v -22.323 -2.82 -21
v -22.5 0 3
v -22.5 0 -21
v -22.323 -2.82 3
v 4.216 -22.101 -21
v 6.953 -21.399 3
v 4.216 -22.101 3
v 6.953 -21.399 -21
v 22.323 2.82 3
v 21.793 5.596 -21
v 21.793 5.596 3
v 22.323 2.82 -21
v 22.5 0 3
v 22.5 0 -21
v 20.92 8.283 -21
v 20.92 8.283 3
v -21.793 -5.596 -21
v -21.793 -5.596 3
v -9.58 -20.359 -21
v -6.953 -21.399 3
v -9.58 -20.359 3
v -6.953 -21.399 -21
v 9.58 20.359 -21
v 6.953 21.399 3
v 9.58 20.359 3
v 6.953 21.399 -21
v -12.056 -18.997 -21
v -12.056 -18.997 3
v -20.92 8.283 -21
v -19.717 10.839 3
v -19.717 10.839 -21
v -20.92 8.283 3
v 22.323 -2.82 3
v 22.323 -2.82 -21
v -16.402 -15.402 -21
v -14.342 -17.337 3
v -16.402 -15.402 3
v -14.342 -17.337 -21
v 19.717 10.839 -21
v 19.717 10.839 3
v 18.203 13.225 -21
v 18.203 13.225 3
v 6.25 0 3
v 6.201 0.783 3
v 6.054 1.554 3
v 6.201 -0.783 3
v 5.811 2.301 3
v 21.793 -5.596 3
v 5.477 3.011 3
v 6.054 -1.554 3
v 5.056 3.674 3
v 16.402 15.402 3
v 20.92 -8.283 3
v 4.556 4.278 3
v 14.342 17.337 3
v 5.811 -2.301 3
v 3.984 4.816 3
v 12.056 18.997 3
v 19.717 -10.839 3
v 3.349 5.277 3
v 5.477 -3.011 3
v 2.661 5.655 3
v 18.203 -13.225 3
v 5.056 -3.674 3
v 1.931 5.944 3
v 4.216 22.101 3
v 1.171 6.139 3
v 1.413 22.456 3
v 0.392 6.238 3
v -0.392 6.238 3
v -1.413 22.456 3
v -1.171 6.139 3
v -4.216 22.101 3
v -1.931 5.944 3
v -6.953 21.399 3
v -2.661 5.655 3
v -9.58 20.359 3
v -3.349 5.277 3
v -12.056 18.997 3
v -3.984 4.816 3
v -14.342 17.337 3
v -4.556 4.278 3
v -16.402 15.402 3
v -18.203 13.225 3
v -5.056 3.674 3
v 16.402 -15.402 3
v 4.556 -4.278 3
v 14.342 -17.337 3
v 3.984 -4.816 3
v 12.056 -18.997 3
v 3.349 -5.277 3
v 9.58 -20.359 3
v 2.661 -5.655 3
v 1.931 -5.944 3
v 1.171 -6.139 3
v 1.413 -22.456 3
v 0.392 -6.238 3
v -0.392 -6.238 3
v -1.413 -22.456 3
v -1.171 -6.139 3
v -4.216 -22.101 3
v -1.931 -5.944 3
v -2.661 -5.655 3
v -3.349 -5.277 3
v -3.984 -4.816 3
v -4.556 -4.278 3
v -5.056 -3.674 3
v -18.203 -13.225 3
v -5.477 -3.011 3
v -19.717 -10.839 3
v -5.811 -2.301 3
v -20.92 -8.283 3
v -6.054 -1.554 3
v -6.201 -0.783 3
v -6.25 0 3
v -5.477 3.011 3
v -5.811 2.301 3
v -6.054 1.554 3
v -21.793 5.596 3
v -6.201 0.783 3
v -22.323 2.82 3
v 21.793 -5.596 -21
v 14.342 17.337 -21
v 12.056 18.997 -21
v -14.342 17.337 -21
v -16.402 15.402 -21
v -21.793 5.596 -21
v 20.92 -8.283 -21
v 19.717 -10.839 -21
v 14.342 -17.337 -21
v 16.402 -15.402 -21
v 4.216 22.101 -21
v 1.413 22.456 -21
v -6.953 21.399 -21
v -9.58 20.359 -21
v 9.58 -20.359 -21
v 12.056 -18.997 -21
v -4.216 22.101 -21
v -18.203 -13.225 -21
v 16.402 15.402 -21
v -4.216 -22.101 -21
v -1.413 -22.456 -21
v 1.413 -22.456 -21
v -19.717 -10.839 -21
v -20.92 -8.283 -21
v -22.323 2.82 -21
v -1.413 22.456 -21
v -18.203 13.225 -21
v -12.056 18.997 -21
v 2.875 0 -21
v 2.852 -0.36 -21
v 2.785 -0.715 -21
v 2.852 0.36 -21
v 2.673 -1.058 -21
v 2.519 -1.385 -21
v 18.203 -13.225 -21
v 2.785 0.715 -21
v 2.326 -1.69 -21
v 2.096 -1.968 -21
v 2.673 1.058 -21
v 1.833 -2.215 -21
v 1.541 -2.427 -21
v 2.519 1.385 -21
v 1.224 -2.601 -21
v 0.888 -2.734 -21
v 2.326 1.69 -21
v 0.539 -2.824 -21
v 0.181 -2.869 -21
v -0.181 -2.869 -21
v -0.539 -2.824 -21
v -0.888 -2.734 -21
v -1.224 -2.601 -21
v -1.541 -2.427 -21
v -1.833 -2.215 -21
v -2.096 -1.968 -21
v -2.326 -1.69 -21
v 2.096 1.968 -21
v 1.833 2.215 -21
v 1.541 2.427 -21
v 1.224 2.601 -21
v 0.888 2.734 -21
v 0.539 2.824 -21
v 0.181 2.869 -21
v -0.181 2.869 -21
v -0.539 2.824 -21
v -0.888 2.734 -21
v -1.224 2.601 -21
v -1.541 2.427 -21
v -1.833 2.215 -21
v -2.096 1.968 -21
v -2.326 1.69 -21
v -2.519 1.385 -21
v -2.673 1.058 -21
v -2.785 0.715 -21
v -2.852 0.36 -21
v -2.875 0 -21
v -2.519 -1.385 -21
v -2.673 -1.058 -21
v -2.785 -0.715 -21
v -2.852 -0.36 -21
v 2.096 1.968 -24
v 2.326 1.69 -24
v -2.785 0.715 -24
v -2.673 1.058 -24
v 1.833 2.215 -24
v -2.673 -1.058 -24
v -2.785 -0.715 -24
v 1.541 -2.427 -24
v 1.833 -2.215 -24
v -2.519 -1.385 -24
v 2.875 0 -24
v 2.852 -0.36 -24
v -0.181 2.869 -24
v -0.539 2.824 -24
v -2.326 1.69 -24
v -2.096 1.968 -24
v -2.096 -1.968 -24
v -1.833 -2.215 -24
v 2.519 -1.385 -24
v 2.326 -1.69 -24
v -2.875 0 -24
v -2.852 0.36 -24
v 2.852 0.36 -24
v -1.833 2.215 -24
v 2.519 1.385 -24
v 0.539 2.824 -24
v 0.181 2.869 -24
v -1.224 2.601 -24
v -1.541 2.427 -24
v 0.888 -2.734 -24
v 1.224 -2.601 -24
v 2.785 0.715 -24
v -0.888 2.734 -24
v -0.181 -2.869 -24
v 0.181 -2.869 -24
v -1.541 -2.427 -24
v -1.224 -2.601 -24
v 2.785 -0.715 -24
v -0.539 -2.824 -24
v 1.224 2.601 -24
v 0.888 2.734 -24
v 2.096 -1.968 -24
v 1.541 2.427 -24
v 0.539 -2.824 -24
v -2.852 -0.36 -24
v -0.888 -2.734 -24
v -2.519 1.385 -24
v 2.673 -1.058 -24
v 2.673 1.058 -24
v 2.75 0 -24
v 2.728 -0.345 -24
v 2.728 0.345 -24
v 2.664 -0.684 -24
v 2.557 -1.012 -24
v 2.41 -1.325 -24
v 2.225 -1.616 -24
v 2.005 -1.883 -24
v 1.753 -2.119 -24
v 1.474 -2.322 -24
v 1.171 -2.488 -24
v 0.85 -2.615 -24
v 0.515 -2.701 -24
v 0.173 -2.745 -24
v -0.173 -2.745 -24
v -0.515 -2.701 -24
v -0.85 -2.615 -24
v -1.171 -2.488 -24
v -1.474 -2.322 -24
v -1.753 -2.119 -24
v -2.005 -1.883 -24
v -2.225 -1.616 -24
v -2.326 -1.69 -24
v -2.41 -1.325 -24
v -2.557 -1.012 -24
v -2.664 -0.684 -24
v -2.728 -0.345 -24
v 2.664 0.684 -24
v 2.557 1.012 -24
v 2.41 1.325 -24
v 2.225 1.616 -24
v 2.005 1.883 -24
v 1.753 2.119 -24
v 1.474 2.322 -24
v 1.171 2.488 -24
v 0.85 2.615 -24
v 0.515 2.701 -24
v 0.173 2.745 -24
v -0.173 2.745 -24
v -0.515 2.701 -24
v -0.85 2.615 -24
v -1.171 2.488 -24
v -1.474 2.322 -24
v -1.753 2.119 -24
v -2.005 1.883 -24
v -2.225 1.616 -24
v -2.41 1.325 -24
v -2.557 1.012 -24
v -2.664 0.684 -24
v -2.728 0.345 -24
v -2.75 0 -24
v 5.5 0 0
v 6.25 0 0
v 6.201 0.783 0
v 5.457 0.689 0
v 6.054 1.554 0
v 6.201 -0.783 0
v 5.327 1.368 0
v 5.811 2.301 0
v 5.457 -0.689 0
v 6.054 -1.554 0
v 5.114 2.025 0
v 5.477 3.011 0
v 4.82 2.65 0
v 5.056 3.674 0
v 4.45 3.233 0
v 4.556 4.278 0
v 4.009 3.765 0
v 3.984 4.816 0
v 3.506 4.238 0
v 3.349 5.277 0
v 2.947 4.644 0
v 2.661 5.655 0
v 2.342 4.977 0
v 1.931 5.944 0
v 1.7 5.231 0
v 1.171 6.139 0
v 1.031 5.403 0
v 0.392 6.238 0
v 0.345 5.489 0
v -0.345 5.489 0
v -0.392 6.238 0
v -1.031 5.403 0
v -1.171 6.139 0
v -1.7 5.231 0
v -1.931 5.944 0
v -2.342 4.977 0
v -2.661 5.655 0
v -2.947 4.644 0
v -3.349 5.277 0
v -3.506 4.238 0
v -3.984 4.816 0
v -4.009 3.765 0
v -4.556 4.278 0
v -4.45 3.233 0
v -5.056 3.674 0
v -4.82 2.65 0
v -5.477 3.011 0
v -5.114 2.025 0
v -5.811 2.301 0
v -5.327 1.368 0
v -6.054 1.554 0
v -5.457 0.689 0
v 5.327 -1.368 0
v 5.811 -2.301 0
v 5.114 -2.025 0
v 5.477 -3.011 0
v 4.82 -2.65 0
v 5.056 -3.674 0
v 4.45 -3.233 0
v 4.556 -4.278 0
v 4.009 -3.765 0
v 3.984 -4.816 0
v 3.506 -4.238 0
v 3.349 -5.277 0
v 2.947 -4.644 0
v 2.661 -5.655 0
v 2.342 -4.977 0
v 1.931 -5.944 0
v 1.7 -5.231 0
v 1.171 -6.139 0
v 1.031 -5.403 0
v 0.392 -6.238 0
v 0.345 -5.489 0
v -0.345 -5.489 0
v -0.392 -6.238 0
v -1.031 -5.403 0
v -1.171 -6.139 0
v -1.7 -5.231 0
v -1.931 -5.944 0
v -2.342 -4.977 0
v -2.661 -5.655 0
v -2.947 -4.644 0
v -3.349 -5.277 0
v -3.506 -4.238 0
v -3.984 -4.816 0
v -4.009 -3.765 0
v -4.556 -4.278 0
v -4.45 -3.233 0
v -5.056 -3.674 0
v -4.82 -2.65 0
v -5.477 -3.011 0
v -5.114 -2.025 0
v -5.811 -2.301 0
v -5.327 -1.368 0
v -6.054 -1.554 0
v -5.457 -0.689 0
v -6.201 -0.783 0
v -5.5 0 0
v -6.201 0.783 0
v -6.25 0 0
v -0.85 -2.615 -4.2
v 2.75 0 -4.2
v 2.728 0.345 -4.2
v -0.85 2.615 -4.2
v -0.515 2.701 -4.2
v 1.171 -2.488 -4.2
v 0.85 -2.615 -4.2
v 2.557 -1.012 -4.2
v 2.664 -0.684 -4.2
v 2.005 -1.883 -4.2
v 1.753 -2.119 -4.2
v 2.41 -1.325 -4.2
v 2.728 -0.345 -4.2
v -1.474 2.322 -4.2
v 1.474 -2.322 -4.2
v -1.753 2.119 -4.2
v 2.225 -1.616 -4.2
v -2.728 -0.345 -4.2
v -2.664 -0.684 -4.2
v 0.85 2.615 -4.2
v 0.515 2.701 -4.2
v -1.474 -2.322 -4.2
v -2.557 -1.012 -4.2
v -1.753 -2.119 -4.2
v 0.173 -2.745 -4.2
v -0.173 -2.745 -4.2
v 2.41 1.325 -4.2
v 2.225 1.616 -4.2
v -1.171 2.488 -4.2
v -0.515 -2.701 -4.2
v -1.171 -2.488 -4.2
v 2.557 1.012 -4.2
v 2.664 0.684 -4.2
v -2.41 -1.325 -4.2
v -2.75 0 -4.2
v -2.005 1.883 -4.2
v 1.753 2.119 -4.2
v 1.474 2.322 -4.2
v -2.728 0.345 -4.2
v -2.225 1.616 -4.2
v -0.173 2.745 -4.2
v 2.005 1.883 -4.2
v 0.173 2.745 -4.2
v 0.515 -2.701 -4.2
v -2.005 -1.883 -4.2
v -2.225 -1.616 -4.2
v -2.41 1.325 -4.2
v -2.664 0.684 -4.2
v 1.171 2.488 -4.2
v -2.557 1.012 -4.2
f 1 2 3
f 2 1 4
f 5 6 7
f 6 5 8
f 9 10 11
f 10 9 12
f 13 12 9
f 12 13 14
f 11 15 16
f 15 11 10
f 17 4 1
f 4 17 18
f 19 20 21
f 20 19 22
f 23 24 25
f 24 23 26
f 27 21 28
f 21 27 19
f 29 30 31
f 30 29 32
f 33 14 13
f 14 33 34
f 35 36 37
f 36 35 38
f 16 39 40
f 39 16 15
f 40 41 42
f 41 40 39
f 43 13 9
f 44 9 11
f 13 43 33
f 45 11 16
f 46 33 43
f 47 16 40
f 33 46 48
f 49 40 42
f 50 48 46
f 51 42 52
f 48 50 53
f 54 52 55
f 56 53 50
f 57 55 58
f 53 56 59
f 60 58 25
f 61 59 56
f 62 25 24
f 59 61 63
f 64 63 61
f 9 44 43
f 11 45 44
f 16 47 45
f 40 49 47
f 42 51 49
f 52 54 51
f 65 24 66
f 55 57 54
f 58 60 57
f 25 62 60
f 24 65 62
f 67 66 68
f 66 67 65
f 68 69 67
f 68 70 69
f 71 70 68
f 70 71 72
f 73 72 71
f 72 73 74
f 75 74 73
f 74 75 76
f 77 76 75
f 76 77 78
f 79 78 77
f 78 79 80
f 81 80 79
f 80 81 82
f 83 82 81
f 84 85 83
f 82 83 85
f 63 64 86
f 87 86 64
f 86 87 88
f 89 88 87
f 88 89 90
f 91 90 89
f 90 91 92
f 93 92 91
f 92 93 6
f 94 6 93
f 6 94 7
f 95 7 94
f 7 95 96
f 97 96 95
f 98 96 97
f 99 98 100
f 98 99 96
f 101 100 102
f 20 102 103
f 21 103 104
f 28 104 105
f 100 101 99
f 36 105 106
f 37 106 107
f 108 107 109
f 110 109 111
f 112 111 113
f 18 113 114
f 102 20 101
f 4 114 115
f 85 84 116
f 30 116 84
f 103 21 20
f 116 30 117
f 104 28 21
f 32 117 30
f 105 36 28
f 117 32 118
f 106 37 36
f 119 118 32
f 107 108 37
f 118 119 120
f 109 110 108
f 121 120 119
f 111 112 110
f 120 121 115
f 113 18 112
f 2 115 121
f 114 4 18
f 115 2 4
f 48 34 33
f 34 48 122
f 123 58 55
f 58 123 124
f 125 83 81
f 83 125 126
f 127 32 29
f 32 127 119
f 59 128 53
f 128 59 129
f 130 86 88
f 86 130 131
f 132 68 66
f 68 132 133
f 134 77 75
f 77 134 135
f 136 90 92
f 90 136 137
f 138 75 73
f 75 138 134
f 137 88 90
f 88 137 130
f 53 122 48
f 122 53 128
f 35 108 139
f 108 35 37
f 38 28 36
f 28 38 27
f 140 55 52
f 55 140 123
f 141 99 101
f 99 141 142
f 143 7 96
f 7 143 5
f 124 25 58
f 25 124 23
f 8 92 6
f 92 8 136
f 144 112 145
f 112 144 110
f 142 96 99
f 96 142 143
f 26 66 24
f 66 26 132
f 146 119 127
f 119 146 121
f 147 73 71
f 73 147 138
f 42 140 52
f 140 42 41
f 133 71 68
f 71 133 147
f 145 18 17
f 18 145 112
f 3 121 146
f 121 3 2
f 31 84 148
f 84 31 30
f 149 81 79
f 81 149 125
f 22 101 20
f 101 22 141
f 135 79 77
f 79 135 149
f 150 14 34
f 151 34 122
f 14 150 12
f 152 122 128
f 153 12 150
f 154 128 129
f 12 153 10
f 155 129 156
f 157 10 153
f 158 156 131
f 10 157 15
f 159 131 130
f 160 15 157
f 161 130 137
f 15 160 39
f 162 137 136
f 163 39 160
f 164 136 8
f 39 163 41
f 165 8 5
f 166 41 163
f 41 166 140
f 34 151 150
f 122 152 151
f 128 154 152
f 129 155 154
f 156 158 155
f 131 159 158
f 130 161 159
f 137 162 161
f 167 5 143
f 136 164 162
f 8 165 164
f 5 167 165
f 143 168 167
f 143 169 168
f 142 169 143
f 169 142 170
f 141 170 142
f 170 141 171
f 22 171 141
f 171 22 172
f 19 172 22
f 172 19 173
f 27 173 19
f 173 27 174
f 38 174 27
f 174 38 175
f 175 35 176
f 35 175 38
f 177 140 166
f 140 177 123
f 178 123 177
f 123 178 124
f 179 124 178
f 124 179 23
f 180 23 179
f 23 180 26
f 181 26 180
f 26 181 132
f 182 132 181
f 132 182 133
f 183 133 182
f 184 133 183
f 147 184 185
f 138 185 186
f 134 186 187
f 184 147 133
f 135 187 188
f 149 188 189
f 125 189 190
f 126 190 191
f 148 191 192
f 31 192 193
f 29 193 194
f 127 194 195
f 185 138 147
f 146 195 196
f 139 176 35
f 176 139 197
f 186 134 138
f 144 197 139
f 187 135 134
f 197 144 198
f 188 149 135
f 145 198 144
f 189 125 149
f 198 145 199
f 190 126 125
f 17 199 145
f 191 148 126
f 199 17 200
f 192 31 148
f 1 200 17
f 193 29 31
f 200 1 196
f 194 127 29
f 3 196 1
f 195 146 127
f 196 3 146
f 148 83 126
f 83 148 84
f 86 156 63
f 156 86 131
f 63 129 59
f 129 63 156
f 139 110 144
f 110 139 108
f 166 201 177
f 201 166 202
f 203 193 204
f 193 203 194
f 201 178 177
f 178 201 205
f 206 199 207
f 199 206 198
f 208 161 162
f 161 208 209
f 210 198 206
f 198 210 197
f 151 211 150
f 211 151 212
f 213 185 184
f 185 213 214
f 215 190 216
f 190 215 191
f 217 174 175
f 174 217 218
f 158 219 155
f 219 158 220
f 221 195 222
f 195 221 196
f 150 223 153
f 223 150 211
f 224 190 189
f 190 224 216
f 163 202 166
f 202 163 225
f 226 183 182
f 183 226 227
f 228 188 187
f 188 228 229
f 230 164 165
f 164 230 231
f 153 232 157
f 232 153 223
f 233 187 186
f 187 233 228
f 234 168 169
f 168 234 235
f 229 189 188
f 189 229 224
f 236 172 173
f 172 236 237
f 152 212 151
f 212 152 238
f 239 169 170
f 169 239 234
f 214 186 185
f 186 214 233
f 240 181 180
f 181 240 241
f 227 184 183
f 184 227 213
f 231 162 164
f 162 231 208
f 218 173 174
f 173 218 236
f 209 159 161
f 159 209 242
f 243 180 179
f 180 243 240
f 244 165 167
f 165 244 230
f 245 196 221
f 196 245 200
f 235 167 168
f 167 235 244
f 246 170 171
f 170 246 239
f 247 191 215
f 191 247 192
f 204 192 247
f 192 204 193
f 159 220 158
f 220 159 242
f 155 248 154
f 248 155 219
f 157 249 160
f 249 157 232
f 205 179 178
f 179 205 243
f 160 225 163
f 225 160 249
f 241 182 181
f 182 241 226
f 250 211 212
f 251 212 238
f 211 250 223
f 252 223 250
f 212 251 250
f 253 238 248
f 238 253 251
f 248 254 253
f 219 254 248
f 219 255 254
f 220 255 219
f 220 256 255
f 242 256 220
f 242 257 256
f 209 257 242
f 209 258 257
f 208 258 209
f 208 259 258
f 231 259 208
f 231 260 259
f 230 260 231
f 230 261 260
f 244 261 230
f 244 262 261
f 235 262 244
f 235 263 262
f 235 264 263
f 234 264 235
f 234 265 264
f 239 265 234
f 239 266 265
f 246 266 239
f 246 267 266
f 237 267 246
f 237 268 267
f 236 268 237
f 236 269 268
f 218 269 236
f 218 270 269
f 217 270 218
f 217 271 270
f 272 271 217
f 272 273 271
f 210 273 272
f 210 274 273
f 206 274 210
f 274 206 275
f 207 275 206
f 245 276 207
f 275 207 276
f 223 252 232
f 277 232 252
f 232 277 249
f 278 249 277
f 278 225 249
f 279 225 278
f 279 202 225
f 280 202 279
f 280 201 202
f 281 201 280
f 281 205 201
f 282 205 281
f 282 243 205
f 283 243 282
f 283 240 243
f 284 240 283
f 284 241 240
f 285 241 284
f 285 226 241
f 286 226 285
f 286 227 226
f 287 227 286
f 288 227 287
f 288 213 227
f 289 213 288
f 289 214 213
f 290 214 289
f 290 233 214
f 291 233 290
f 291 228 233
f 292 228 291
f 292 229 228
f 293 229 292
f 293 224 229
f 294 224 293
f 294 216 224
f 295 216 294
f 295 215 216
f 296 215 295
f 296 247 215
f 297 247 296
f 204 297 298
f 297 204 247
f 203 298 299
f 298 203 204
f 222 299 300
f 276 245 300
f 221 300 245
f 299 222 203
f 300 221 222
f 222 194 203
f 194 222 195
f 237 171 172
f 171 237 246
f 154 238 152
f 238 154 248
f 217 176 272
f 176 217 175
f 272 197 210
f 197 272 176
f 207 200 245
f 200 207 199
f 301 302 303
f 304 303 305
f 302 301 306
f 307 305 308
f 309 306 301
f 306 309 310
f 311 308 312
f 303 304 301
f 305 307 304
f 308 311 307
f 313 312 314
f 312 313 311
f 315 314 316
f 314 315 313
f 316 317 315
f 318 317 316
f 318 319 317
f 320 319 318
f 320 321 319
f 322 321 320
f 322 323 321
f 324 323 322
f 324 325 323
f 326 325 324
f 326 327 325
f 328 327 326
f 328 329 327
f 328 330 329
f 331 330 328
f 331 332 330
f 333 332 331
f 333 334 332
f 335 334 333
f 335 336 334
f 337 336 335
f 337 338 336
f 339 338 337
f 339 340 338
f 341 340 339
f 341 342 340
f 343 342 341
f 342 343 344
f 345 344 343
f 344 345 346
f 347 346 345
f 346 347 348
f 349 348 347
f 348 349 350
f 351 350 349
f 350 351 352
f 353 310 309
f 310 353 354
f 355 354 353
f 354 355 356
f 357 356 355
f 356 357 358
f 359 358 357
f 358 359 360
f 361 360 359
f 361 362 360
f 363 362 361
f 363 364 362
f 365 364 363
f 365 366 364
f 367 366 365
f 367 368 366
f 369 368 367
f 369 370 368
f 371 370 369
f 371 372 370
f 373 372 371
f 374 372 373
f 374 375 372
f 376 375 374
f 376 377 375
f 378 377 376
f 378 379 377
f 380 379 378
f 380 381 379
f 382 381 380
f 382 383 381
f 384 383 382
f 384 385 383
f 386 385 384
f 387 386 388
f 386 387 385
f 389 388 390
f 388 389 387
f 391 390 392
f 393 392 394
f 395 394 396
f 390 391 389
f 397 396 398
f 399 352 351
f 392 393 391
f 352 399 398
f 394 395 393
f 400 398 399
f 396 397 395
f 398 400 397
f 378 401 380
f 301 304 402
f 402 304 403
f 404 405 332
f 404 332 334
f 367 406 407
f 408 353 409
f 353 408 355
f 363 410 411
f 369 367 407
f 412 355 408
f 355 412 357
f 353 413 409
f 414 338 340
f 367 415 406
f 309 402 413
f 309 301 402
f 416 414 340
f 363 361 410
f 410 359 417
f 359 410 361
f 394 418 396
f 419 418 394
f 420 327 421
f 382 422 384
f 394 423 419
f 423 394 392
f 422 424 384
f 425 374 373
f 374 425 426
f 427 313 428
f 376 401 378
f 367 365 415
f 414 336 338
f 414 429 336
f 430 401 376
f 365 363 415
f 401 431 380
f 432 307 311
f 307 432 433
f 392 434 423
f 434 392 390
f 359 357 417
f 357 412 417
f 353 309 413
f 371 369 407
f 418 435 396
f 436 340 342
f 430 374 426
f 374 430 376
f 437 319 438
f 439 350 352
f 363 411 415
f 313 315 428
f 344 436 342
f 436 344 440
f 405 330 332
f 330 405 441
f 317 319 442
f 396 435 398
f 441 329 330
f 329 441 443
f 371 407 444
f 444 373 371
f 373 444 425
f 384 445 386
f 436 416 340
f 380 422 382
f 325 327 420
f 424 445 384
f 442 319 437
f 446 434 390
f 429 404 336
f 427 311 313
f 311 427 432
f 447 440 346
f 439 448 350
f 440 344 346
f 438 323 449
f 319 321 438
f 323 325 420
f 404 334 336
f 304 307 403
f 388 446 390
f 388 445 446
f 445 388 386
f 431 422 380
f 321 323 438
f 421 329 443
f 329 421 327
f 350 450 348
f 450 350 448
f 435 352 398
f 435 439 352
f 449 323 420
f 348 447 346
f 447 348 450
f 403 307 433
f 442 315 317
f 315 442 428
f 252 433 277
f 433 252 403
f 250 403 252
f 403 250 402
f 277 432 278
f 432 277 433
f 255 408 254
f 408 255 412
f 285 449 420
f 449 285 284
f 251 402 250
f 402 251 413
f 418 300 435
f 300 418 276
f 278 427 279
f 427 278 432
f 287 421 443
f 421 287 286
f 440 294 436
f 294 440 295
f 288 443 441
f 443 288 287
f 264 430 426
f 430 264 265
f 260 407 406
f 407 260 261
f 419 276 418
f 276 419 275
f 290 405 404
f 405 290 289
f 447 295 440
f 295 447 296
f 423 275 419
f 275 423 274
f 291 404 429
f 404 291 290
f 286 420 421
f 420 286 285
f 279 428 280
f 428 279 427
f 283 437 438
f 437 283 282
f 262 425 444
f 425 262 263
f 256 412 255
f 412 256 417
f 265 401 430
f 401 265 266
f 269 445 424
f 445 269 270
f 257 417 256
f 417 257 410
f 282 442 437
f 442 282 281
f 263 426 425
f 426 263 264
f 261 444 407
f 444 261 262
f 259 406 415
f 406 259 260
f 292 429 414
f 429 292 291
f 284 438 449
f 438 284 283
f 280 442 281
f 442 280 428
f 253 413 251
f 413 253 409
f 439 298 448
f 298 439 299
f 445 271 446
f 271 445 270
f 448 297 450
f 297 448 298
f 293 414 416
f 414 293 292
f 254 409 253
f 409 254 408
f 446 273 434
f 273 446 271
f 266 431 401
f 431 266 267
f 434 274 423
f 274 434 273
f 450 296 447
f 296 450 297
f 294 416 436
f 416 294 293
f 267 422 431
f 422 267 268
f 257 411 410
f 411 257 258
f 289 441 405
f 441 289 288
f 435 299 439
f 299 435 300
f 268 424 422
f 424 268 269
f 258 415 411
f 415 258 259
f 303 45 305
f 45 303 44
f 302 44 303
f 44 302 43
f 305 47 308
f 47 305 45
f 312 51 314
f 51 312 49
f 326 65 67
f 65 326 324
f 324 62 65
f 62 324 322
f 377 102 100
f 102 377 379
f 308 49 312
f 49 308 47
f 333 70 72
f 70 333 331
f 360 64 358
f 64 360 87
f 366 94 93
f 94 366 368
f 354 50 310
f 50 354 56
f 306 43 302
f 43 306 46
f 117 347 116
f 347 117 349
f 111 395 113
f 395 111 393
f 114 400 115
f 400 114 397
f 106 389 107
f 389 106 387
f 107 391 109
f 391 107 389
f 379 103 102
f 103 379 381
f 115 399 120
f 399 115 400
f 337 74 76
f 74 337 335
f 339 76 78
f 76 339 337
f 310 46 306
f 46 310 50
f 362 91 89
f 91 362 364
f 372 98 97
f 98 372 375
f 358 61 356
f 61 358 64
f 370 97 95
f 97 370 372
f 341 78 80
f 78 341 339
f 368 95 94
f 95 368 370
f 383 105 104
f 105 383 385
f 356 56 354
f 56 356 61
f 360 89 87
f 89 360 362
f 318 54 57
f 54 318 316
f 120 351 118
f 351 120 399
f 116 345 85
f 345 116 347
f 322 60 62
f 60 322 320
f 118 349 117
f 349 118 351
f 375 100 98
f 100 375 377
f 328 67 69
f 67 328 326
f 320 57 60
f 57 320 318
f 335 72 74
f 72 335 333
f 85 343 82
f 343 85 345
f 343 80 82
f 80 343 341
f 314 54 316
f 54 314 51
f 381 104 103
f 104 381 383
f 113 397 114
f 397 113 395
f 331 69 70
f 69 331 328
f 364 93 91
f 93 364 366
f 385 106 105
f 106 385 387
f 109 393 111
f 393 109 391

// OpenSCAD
$fn = 50;


difference() {
	union() {
		translate(v = [0, 0, -21.0000000000]) {
			cylinder(h = 24, r = 22.5000000000);
		}
		#translate(v = [0, 0, -24.0000000000]) {
			cylinder(h = 24, r = 2.8750000000);
		}
	}
	union() {
		translate(v = [0, 0, 0]) {
			rotate(a = [0, 0, 0]) {
				difference() {
					union() {
						translate(v = [0, 0, -24.0000000000]) {
							cylinder(h = 24, r = 2.2500000000);
						}
						translate(v = [0, 0, -4.2000000000]) {
							cylinder(h = 4.2000000000, r1 = 2.7500000000, r2 = 5.5000000000);
						}
						translate(v = [0, 0, -24.0000000000]) {
							cylinder(h = 24, r = 2.7500000000);
						}
						translate(v = [0, 0, -24.0000000000]) {
							cylinder(h = 24, r = 2.2500000000);
						}
					}
					union();
				}
			}
		}
		#cylinder(h = 3, r = 6.2500000000);
	}
}
